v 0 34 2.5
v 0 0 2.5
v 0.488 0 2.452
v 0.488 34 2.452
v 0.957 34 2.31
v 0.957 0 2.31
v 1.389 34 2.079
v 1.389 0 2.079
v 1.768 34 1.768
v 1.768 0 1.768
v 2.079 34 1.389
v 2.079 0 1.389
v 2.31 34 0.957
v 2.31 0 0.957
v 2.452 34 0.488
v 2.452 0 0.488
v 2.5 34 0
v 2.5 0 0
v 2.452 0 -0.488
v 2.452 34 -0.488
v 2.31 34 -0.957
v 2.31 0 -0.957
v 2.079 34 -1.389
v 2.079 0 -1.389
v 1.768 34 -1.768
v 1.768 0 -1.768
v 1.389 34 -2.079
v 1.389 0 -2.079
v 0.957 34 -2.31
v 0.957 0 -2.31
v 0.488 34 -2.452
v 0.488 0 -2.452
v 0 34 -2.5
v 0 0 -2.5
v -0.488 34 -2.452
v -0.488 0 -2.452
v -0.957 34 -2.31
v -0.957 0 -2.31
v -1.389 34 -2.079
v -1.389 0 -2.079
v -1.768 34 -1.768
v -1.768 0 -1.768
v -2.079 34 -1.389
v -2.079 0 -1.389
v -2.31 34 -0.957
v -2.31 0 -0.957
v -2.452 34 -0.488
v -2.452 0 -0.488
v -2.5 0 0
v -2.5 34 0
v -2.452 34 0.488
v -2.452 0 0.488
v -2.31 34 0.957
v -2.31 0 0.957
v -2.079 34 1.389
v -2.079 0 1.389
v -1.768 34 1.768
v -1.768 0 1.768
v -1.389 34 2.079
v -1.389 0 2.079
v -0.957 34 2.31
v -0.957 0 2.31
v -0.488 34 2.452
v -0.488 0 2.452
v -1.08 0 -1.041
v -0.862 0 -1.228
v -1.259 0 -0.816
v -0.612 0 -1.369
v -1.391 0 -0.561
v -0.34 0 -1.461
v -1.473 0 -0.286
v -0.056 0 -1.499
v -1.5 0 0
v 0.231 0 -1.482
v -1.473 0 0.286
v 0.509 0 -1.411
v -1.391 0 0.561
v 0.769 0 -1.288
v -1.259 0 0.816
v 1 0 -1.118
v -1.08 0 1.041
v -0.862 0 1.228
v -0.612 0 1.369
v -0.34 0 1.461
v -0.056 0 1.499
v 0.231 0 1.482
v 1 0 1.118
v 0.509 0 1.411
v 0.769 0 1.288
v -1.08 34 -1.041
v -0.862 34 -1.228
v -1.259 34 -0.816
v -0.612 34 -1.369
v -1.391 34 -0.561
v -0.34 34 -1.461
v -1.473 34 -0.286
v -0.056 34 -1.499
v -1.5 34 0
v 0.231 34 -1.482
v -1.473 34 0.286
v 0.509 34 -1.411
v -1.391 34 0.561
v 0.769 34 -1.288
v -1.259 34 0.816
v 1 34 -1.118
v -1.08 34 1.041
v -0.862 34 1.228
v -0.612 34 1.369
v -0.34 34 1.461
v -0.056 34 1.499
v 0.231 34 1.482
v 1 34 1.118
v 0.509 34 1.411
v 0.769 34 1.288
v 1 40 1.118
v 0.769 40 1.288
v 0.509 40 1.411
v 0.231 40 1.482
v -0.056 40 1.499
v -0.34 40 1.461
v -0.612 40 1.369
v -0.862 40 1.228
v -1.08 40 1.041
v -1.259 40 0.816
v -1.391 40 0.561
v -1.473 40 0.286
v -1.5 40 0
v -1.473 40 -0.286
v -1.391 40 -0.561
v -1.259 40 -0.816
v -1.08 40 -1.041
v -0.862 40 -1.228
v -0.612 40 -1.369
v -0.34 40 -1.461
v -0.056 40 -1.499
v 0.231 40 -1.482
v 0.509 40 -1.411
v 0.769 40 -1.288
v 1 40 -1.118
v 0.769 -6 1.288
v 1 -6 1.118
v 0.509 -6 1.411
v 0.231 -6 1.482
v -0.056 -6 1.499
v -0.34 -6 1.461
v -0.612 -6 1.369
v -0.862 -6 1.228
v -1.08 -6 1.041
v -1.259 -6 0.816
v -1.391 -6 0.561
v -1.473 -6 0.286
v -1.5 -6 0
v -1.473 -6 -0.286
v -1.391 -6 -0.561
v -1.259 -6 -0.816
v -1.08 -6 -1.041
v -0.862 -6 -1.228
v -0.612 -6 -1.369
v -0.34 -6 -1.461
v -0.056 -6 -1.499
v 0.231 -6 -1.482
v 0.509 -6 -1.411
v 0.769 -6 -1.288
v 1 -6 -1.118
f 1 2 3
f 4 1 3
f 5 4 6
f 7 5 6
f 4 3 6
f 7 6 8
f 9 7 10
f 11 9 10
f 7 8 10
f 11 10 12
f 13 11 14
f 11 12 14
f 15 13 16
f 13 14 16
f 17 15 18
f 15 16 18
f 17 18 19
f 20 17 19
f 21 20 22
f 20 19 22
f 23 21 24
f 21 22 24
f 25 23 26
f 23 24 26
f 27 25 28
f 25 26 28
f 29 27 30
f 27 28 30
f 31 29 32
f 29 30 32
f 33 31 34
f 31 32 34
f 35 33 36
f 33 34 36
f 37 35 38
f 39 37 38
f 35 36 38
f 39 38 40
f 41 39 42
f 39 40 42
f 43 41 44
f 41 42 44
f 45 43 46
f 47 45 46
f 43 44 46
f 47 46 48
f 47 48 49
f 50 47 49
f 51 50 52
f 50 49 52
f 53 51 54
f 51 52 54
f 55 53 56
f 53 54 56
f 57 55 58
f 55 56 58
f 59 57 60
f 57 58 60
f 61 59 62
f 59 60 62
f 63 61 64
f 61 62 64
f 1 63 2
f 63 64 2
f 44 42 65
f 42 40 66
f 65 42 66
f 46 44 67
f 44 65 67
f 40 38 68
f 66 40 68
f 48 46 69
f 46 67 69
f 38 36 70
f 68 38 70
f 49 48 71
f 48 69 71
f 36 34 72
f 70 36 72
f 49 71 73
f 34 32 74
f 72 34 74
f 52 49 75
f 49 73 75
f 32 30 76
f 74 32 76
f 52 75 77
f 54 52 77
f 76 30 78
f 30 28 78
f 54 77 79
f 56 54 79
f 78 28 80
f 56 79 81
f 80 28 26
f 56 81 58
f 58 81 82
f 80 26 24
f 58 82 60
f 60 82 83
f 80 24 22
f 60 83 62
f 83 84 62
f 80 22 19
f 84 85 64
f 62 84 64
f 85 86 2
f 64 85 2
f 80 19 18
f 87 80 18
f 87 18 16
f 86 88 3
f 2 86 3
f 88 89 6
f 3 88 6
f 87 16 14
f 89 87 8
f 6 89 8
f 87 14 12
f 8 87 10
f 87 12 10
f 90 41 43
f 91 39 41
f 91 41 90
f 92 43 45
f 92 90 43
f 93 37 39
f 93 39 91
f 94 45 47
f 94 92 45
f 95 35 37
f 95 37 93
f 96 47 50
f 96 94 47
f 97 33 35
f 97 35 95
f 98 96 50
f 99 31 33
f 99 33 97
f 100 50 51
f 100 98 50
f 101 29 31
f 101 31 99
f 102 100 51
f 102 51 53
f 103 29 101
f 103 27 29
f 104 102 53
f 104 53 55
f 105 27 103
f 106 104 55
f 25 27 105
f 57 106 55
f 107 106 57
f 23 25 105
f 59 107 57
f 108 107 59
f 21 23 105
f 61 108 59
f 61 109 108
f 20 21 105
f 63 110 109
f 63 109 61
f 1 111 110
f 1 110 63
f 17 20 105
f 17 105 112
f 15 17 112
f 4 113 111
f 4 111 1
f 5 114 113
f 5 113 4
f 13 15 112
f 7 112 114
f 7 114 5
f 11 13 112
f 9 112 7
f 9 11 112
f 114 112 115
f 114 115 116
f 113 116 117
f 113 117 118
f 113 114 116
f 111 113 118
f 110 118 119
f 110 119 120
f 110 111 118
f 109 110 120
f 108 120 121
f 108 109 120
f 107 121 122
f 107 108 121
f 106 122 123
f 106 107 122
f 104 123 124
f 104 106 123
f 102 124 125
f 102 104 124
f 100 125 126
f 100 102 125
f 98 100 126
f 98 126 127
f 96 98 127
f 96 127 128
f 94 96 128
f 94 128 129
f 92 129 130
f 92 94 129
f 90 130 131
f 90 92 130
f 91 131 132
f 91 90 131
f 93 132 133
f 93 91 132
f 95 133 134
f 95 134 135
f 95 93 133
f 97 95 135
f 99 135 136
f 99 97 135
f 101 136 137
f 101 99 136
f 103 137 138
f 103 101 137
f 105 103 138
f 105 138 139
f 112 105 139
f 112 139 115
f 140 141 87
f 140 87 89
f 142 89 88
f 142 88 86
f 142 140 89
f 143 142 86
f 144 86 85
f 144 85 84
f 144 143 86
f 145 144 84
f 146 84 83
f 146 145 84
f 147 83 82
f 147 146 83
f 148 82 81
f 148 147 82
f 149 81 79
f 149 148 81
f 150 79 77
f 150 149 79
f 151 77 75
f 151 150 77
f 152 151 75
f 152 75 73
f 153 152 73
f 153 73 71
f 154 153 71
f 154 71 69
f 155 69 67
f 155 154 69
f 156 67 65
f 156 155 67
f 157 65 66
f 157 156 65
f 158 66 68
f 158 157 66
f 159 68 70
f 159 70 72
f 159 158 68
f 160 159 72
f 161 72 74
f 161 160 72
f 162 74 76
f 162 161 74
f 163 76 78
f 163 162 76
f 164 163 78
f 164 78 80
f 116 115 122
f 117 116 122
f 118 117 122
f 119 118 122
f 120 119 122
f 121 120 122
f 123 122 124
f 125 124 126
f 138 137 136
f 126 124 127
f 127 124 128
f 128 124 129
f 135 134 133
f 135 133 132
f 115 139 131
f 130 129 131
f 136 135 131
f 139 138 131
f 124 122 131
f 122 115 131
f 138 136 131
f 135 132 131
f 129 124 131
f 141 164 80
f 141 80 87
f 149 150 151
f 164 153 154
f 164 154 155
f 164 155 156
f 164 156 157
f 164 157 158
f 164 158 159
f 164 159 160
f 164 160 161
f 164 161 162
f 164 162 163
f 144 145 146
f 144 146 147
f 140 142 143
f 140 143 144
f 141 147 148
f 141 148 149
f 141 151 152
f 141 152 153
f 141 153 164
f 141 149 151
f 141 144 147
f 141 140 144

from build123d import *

# Parameters (mm, degrees)
SKETCH_1_R      = 2.5
EXTRUDE_1_DEPTH = 34
EXTRUDE_2_DEPTH = 6
EXTRUDE_START   = 6
EXTRUDE_3_DEPTH = 6


with BuildPart() as part:
    # 草图1 → 凸台-拉伸1 (new body)
    with BuildSketch(Plane(origin=(0, 0, 0), x_dir=(1, 0, 0), z_dir=(0, 1, 0))):
        with Locations(Location((0, 0, 0), (0, 0, 270))):
            Circle(SKETCH_1_R)
    extrude(amount=EXTRUDE_1_DEPTH)

    # 草图2 → 凸台-拉伸2 (add)
    with BuildSketch(Plane(origin=(0, 34, 0), x_dir=(1, 0, 0), z_dir=(0, 1, 0))):
        with BuildLine():
            Line((1, 1.118033989), (1, -1.118033989))
            ThreePointArc((1, -1.118033989), (-1.5, 0), (1, 1.118033989))
        make_face()
    extrude(amount=EXTRUDE_2_DEPTH)

    # 草图3 → 凸台-拉伸3 (add)
    with BuildSketch(Plane.XZ.offset(EXTRUDE_START)):
        with BuildLine():
            Line((1, -1.118033989), (1, 1.118033989))
            ThreePointArc((1, 1.118033989), (-1.5, 0), (1, -1.118033989))
        make_face()
    extrude(amount=-EXTRUDE_3_DEPTH)


solid = part.part
